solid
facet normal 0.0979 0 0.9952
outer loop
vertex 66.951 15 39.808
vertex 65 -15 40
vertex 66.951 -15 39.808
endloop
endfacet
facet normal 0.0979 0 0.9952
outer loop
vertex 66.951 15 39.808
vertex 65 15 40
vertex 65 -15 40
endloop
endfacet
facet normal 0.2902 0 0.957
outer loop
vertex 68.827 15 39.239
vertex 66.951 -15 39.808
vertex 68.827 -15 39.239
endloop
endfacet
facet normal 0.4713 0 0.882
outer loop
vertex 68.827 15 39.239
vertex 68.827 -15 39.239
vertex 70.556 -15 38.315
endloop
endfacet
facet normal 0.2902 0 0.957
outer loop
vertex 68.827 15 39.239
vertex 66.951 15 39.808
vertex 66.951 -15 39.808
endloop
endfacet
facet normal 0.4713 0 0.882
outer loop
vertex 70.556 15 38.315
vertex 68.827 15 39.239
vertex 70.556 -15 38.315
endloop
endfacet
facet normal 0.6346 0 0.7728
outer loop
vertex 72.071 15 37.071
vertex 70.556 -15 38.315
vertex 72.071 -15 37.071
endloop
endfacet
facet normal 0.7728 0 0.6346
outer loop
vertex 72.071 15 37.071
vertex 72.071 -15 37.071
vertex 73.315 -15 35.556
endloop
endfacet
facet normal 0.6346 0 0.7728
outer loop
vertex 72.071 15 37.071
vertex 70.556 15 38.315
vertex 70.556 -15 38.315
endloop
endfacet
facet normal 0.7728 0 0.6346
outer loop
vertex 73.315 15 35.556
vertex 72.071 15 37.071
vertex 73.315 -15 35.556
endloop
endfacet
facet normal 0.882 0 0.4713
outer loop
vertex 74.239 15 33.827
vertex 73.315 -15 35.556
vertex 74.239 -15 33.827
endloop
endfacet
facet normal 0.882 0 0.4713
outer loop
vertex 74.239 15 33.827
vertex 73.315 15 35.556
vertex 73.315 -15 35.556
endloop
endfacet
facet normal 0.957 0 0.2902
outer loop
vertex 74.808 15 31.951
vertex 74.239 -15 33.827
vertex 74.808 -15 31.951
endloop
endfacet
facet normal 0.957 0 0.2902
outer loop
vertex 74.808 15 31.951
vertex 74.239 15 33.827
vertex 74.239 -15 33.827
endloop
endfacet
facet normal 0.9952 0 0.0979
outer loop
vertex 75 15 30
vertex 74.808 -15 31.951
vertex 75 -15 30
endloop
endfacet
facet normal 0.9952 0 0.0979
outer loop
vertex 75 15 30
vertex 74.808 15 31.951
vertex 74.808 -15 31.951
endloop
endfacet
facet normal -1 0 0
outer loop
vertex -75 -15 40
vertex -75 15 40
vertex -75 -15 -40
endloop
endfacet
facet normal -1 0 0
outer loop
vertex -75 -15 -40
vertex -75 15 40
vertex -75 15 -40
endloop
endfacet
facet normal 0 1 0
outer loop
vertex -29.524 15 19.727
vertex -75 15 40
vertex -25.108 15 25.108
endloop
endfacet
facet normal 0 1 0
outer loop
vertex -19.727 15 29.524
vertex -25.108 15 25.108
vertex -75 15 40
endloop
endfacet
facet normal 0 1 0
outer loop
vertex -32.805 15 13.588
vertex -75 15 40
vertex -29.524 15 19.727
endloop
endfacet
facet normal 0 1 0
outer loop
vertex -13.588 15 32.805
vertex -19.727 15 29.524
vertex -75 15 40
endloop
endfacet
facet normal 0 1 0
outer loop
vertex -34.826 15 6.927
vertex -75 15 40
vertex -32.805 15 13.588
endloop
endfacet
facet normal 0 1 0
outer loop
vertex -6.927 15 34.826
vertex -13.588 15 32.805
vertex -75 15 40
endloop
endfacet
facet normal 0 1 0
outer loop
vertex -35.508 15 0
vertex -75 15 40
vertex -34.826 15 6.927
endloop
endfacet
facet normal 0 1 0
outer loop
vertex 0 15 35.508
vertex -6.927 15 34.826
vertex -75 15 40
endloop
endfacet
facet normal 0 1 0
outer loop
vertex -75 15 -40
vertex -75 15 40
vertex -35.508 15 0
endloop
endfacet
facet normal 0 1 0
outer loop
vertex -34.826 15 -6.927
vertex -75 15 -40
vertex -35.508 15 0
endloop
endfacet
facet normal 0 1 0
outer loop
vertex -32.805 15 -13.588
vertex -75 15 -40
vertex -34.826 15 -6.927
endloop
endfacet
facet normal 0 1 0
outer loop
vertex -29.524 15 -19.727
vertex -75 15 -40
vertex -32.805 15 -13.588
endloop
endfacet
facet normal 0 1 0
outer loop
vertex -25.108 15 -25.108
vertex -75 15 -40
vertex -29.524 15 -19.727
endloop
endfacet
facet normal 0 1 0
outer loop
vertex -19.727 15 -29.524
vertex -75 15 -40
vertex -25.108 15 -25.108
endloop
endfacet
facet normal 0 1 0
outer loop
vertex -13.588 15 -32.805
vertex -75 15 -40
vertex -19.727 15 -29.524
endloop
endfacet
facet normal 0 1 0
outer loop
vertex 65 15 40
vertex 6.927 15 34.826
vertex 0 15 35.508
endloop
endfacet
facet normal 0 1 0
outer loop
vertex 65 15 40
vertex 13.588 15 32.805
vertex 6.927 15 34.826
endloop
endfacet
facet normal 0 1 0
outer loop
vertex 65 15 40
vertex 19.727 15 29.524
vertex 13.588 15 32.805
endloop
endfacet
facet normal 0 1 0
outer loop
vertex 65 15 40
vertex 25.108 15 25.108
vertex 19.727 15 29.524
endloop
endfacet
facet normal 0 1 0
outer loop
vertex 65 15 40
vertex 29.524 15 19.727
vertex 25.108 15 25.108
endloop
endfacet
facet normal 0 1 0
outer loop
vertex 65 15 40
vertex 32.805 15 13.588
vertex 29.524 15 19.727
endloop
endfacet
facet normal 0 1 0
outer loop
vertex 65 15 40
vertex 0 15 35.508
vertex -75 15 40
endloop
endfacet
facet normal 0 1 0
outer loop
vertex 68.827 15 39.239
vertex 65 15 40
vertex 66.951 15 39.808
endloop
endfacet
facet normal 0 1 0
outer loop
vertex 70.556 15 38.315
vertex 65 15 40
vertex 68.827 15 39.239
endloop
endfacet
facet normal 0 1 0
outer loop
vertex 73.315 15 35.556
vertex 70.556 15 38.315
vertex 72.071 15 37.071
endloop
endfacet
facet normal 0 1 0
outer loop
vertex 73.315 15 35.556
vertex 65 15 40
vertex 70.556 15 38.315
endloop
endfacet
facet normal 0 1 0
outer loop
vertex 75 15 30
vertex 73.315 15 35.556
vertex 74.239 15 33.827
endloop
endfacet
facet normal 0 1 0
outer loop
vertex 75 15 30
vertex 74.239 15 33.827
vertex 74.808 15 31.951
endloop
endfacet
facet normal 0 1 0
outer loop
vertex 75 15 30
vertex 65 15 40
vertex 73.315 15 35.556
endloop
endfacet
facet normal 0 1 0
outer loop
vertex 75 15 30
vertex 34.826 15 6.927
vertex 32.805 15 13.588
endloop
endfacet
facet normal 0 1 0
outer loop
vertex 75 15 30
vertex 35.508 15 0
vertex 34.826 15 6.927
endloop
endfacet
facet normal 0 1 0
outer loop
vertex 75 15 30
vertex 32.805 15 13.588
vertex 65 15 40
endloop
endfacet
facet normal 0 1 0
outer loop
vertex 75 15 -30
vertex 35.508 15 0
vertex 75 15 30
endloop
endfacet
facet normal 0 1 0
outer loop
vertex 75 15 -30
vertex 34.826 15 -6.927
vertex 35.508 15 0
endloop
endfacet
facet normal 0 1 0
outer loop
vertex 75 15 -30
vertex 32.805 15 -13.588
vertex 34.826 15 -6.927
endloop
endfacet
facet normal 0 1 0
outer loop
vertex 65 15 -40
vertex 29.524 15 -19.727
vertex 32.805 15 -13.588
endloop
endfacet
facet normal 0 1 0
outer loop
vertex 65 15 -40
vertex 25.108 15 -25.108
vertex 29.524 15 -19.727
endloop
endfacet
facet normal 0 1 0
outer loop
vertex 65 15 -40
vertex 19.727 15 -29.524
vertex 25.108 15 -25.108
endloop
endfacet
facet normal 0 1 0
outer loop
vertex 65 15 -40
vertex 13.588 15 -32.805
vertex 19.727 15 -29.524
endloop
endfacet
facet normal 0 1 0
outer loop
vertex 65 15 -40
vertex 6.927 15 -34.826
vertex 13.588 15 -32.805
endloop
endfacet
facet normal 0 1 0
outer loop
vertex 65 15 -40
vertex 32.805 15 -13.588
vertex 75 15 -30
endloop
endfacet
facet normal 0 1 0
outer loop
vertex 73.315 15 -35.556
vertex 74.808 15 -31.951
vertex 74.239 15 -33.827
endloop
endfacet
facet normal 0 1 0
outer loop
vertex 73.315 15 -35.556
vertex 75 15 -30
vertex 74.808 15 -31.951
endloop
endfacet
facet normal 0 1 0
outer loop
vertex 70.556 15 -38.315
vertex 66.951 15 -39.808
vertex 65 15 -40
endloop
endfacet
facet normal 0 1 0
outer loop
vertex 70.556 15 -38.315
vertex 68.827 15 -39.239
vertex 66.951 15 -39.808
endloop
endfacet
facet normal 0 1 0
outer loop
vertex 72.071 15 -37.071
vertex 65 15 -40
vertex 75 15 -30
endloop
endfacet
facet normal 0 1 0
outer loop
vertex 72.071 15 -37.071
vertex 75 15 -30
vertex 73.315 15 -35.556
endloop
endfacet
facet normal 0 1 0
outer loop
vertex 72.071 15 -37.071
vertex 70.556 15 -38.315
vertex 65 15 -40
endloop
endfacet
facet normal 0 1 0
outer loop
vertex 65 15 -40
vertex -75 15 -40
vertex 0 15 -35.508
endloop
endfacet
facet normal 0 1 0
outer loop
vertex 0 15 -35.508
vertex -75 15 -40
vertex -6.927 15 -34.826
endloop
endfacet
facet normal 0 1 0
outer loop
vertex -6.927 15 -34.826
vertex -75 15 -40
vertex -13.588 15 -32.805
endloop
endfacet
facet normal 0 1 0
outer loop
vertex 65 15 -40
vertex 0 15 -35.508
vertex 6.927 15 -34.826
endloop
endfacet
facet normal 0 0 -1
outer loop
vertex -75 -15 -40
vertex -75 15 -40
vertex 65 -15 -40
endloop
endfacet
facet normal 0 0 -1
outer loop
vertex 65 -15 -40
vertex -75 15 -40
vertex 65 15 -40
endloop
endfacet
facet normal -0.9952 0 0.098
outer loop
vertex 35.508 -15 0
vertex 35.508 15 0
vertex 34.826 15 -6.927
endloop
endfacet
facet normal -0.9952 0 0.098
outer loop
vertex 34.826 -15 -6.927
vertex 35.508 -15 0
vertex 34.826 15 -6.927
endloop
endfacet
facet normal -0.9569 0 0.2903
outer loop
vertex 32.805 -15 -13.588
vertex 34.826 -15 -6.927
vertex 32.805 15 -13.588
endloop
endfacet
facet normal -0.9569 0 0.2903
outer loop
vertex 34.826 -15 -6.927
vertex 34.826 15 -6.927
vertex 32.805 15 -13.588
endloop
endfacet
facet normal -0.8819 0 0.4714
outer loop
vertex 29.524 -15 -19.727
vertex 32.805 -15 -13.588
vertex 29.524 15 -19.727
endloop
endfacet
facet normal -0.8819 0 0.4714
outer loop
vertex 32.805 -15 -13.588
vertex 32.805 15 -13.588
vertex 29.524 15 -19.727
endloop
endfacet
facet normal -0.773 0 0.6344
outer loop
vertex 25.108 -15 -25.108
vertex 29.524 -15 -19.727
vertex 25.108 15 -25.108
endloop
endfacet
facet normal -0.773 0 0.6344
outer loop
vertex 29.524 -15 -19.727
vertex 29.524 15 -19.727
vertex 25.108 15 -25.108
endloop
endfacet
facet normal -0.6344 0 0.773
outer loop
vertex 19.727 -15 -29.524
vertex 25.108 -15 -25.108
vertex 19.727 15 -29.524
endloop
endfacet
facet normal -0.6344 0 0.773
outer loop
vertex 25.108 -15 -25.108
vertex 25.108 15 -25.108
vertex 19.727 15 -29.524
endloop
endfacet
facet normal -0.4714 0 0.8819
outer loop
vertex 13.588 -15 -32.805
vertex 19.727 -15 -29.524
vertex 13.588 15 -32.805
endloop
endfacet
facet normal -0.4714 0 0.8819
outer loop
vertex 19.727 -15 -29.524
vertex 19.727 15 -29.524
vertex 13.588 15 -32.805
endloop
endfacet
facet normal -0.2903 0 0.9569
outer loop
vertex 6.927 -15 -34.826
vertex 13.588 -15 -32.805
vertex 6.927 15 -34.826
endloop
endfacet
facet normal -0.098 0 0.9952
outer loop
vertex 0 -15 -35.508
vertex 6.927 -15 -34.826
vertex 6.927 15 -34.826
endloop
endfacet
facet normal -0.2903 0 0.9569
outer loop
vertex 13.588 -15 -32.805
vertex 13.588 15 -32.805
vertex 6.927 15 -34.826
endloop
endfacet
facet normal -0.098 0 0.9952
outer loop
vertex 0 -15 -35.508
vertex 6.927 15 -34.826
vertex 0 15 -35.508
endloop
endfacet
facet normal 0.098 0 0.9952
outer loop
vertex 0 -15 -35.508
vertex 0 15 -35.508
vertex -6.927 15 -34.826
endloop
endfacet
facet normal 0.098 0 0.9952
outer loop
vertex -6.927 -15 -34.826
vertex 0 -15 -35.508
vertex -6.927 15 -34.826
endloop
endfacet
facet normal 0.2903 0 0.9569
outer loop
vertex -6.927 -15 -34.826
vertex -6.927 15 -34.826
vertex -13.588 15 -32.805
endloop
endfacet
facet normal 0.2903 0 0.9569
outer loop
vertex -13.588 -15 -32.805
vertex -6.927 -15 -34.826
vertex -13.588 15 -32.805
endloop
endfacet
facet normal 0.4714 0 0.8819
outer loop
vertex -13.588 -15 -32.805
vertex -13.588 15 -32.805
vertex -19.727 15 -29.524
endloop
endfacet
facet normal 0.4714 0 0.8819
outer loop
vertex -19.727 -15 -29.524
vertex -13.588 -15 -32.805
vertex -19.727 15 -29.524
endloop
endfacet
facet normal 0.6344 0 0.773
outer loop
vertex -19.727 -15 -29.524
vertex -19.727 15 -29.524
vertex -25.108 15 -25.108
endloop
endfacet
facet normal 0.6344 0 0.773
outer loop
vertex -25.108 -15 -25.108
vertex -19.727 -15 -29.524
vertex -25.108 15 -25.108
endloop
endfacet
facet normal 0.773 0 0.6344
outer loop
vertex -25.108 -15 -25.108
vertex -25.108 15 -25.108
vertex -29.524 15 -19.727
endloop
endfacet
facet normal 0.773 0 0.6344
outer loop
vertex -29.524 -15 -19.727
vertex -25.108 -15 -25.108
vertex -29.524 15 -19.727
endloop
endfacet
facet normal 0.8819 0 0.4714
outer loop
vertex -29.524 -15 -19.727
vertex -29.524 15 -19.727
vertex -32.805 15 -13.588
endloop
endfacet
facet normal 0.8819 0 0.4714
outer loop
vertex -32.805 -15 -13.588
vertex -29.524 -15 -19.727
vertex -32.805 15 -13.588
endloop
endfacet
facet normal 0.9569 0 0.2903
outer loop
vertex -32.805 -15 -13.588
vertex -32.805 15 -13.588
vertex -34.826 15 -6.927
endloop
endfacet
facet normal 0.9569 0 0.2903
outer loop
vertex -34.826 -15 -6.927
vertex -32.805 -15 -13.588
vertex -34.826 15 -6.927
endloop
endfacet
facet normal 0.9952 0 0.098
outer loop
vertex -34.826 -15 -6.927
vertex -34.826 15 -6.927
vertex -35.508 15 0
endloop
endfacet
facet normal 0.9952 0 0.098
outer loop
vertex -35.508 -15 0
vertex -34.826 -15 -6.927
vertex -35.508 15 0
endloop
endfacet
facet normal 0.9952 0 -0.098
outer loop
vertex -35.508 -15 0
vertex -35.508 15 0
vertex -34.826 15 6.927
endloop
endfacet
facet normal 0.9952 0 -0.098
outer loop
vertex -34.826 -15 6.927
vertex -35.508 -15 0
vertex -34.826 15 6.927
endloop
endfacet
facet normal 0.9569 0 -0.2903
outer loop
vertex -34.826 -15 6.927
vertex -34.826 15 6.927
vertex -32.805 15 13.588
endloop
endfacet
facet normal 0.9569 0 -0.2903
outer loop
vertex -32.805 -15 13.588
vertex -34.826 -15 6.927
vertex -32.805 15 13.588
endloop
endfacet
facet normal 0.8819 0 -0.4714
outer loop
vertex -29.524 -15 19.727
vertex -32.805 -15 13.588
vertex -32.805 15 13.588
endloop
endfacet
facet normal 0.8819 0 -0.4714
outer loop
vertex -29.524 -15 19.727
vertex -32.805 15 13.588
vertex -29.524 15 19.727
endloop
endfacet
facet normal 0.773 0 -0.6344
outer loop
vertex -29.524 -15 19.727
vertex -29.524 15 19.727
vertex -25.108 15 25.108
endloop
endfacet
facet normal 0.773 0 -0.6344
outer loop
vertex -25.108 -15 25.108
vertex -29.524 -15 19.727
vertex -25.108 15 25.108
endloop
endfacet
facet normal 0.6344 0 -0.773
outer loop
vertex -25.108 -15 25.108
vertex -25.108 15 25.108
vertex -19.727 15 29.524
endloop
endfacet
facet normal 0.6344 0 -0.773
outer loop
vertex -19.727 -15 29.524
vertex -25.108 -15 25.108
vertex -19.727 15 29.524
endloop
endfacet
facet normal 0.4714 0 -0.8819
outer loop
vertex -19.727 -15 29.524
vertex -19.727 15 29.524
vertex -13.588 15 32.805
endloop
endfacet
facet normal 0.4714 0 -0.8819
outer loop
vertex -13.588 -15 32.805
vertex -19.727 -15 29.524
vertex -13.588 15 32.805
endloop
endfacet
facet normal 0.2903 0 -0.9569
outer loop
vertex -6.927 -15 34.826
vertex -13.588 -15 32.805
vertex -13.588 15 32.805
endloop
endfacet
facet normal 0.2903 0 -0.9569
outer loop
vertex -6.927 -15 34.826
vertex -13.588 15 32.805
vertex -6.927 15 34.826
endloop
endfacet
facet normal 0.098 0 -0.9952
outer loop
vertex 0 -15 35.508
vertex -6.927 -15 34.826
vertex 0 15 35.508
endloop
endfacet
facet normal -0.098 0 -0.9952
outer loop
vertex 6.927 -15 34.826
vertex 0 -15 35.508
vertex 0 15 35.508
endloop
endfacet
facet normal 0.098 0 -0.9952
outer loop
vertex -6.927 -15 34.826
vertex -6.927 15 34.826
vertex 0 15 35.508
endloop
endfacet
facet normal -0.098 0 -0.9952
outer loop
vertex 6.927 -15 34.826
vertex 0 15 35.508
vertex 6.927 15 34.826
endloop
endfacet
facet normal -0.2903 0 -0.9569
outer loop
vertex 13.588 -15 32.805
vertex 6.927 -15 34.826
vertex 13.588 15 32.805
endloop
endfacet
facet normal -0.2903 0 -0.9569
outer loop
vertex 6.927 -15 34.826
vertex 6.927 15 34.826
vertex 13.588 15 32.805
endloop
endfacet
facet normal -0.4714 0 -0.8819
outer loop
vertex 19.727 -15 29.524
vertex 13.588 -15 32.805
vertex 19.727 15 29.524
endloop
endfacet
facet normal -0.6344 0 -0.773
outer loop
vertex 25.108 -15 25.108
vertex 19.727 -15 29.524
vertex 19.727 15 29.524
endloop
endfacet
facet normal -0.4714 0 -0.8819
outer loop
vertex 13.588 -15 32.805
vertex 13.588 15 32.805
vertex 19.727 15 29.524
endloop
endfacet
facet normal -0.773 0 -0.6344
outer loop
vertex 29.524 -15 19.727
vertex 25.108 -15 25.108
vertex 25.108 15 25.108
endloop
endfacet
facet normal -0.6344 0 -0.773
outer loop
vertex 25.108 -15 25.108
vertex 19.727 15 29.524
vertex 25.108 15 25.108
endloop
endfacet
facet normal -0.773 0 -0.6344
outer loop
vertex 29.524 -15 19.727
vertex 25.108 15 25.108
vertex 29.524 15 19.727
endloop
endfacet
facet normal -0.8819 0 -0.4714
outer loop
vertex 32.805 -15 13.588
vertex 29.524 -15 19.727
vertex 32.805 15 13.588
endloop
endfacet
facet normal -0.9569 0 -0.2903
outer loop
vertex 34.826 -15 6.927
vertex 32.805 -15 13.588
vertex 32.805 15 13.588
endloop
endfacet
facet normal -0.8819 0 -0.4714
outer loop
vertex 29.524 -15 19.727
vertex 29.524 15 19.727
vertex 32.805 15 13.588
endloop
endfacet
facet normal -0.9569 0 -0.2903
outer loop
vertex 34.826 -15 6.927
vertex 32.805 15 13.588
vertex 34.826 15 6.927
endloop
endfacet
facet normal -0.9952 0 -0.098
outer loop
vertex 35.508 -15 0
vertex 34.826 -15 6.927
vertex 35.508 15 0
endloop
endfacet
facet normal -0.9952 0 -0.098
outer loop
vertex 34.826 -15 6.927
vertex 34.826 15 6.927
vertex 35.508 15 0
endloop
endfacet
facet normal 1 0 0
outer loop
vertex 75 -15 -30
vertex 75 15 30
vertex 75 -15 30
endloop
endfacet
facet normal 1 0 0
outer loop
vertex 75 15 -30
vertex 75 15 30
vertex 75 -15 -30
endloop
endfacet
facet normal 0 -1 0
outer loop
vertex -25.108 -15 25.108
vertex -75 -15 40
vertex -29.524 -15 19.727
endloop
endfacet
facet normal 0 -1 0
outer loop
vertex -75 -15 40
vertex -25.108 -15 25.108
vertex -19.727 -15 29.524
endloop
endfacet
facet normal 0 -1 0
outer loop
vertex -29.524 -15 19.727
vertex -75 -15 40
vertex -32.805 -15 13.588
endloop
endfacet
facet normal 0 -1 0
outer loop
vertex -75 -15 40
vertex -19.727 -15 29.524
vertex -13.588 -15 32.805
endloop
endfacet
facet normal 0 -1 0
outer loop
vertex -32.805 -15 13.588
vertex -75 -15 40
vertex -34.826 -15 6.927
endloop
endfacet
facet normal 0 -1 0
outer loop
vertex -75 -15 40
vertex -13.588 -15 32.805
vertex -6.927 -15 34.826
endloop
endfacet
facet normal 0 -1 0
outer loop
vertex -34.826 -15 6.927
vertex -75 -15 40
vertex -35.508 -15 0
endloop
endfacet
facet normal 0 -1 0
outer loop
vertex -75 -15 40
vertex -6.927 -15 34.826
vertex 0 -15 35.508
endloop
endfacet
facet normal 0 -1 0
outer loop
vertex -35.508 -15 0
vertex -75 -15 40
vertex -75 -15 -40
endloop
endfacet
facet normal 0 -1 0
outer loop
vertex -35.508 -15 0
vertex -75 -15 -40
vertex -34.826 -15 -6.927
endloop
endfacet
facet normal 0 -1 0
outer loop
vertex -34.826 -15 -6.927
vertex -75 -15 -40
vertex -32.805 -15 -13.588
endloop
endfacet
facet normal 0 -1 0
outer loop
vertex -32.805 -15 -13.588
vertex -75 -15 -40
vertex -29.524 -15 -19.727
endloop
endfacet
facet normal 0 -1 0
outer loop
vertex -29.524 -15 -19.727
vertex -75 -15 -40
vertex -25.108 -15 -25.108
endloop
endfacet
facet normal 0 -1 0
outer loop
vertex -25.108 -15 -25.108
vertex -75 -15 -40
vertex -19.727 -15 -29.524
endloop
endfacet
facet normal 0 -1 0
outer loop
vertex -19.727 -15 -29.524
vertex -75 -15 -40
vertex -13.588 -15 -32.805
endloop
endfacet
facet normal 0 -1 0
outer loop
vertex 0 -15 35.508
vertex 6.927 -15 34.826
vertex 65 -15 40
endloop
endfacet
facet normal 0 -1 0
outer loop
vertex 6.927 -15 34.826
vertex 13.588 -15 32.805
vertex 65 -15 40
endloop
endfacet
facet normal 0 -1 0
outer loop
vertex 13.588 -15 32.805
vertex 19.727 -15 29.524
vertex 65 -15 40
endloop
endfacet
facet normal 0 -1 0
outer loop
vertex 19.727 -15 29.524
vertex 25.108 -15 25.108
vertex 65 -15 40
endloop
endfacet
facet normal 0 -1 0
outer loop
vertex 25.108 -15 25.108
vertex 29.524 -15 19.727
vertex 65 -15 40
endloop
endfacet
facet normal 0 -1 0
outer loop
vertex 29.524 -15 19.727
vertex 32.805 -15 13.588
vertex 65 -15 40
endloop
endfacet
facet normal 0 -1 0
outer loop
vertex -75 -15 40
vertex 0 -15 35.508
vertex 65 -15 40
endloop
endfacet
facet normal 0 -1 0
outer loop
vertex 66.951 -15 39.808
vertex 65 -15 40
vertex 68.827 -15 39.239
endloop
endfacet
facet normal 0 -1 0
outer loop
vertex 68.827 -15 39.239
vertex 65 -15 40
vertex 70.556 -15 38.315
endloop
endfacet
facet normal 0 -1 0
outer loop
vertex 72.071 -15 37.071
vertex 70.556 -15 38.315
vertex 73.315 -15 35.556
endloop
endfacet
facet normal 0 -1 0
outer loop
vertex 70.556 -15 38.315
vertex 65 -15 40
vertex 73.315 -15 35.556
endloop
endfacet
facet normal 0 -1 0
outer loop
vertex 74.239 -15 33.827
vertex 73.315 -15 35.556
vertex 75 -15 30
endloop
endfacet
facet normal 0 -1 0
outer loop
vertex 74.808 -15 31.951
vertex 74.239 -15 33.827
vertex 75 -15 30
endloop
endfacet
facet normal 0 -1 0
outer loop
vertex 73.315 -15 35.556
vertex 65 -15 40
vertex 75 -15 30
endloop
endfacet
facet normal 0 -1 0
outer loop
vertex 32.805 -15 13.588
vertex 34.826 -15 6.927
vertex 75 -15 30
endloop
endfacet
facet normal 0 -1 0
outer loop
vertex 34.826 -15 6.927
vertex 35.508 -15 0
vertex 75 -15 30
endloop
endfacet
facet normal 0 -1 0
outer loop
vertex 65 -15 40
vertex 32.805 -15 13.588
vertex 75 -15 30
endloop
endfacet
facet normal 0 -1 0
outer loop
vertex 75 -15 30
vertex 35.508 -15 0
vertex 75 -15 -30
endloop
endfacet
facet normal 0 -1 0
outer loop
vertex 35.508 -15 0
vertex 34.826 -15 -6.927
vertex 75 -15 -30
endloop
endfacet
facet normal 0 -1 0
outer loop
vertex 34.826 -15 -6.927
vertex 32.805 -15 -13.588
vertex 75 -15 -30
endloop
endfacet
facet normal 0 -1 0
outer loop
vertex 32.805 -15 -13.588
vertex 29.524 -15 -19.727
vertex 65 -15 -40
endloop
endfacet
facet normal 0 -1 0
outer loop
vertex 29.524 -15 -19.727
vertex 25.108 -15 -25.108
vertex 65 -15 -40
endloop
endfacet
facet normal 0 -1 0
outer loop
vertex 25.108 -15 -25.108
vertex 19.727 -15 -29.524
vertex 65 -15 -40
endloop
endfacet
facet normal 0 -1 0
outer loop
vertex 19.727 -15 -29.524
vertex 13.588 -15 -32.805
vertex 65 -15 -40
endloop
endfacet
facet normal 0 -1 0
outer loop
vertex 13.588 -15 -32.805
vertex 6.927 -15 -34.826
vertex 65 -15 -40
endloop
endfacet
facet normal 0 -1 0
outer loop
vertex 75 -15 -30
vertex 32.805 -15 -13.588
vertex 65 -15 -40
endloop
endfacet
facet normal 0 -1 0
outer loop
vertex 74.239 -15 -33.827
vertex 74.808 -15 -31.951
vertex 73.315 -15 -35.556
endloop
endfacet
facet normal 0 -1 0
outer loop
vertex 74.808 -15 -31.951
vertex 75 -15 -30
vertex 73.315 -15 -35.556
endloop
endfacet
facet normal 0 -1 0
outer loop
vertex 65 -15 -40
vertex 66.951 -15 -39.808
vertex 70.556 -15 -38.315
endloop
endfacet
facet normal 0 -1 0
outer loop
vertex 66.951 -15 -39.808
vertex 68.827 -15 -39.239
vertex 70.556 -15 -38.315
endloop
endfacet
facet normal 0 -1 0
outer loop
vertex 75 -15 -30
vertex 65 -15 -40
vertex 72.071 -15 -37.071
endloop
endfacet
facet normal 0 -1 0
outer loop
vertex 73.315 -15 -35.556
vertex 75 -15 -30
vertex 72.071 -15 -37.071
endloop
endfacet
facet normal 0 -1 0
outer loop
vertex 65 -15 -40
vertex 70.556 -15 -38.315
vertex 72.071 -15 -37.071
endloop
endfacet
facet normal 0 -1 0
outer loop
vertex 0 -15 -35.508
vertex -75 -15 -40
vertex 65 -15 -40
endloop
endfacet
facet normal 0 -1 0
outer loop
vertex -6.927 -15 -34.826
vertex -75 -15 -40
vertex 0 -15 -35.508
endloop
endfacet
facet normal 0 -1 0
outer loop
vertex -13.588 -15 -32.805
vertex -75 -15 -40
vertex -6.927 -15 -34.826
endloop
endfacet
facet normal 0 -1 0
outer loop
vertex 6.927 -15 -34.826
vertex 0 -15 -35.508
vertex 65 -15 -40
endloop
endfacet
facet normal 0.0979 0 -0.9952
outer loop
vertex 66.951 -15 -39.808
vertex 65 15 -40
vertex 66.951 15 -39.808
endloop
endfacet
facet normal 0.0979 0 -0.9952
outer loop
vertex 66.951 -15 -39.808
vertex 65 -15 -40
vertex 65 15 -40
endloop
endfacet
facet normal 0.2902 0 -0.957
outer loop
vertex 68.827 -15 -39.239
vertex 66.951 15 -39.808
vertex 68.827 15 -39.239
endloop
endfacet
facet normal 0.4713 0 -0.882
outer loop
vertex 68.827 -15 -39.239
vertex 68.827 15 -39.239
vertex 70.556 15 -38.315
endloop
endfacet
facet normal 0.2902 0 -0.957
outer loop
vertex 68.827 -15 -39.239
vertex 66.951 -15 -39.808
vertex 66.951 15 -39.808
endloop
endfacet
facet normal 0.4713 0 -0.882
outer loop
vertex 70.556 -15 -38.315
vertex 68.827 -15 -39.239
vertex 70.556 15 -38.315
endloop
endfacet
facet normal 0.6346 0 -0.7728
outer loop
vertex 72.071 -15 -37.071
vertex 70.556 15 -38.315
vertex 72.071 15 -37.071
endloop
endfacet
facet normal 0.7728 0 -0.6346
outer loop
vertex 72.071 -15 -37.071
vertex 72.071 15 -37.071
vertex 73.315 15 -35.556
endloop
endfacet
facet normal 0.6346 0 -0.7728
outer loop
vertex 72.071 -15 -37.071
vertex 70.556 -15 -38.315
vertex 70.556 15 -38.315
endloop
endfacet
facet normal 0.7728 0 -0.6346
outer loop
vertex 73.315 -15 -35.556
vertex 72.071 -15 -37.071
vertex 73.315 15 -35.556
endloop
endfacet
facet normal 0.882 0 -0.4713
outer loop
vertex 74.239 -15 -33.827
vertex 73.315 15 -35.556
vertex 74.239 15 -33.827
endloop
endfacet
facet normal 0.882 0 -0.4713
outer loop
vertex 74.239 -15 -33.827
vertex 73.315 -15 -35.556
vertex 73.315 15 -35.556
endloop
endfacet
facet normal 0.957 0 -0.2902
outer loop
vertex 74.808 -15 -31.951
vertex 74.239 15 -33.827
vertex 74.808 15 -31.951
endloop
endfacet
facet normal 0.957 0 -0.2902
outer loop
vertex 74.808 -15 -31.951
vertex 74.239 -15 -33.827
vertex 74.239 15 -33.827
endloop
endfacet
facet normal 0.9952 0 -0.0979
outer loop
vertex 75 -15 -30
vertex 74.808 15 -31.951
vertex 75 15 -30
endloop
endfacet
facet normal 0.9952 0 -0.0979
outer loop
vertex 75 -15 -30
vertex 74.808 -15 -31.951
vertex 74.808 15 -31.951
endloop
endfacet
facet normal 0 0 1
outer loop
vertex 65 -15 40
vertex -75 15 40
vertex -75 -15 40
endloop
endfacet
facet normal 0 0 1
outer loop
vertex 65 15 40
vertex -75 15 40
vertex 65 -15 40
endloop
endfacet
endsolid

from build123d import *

# Parameters (mm, degrees)
SKETCH1_W           = 150
SKETCH1_H           = 80
BOSS_EXTRUDE1_DEPTH = 15
SKETCH2_R           = 35.508350292
CUT_EXTRUDE1_DEPTH  = 31
FILLET1_R           = 10


with BuildPart() as part:
    # Sketch1 → Boss-Extrude1 (new body, symmetric)
    with BuildSketch(Plane(origin=(0, 0, 0), x_dir=(1, 0, 0), z_dir=(0, 1, 0))):
        Rectangle(SKETCH1_W, SKETCH1_H)
    extrude(amount=BOSS_EXTRUDE1_DEPTH, both=True)

    # Sketch2 → Cut-Extrude1 (cut, through all)
    with BuildSketch(Plane(origin=(0, 15, 0), x_dir=(1, 0, 0), z_dir=(0, 1, 0))):
        Circle(SKETCH2_R)
    extrude(amount=-CUT_EXTRUDE1_DEPTH, mode=Mode.SUBTRACT)

    # Fillet1
    fillet1_edges = [part.edges().sort_by_distance(p)[0] for p in [
        (75, 0, 40),
        (75, 0, -40),
    ]]
    fillet(fillet1_edges, radius=FILLET1_R)


solid = part.part
